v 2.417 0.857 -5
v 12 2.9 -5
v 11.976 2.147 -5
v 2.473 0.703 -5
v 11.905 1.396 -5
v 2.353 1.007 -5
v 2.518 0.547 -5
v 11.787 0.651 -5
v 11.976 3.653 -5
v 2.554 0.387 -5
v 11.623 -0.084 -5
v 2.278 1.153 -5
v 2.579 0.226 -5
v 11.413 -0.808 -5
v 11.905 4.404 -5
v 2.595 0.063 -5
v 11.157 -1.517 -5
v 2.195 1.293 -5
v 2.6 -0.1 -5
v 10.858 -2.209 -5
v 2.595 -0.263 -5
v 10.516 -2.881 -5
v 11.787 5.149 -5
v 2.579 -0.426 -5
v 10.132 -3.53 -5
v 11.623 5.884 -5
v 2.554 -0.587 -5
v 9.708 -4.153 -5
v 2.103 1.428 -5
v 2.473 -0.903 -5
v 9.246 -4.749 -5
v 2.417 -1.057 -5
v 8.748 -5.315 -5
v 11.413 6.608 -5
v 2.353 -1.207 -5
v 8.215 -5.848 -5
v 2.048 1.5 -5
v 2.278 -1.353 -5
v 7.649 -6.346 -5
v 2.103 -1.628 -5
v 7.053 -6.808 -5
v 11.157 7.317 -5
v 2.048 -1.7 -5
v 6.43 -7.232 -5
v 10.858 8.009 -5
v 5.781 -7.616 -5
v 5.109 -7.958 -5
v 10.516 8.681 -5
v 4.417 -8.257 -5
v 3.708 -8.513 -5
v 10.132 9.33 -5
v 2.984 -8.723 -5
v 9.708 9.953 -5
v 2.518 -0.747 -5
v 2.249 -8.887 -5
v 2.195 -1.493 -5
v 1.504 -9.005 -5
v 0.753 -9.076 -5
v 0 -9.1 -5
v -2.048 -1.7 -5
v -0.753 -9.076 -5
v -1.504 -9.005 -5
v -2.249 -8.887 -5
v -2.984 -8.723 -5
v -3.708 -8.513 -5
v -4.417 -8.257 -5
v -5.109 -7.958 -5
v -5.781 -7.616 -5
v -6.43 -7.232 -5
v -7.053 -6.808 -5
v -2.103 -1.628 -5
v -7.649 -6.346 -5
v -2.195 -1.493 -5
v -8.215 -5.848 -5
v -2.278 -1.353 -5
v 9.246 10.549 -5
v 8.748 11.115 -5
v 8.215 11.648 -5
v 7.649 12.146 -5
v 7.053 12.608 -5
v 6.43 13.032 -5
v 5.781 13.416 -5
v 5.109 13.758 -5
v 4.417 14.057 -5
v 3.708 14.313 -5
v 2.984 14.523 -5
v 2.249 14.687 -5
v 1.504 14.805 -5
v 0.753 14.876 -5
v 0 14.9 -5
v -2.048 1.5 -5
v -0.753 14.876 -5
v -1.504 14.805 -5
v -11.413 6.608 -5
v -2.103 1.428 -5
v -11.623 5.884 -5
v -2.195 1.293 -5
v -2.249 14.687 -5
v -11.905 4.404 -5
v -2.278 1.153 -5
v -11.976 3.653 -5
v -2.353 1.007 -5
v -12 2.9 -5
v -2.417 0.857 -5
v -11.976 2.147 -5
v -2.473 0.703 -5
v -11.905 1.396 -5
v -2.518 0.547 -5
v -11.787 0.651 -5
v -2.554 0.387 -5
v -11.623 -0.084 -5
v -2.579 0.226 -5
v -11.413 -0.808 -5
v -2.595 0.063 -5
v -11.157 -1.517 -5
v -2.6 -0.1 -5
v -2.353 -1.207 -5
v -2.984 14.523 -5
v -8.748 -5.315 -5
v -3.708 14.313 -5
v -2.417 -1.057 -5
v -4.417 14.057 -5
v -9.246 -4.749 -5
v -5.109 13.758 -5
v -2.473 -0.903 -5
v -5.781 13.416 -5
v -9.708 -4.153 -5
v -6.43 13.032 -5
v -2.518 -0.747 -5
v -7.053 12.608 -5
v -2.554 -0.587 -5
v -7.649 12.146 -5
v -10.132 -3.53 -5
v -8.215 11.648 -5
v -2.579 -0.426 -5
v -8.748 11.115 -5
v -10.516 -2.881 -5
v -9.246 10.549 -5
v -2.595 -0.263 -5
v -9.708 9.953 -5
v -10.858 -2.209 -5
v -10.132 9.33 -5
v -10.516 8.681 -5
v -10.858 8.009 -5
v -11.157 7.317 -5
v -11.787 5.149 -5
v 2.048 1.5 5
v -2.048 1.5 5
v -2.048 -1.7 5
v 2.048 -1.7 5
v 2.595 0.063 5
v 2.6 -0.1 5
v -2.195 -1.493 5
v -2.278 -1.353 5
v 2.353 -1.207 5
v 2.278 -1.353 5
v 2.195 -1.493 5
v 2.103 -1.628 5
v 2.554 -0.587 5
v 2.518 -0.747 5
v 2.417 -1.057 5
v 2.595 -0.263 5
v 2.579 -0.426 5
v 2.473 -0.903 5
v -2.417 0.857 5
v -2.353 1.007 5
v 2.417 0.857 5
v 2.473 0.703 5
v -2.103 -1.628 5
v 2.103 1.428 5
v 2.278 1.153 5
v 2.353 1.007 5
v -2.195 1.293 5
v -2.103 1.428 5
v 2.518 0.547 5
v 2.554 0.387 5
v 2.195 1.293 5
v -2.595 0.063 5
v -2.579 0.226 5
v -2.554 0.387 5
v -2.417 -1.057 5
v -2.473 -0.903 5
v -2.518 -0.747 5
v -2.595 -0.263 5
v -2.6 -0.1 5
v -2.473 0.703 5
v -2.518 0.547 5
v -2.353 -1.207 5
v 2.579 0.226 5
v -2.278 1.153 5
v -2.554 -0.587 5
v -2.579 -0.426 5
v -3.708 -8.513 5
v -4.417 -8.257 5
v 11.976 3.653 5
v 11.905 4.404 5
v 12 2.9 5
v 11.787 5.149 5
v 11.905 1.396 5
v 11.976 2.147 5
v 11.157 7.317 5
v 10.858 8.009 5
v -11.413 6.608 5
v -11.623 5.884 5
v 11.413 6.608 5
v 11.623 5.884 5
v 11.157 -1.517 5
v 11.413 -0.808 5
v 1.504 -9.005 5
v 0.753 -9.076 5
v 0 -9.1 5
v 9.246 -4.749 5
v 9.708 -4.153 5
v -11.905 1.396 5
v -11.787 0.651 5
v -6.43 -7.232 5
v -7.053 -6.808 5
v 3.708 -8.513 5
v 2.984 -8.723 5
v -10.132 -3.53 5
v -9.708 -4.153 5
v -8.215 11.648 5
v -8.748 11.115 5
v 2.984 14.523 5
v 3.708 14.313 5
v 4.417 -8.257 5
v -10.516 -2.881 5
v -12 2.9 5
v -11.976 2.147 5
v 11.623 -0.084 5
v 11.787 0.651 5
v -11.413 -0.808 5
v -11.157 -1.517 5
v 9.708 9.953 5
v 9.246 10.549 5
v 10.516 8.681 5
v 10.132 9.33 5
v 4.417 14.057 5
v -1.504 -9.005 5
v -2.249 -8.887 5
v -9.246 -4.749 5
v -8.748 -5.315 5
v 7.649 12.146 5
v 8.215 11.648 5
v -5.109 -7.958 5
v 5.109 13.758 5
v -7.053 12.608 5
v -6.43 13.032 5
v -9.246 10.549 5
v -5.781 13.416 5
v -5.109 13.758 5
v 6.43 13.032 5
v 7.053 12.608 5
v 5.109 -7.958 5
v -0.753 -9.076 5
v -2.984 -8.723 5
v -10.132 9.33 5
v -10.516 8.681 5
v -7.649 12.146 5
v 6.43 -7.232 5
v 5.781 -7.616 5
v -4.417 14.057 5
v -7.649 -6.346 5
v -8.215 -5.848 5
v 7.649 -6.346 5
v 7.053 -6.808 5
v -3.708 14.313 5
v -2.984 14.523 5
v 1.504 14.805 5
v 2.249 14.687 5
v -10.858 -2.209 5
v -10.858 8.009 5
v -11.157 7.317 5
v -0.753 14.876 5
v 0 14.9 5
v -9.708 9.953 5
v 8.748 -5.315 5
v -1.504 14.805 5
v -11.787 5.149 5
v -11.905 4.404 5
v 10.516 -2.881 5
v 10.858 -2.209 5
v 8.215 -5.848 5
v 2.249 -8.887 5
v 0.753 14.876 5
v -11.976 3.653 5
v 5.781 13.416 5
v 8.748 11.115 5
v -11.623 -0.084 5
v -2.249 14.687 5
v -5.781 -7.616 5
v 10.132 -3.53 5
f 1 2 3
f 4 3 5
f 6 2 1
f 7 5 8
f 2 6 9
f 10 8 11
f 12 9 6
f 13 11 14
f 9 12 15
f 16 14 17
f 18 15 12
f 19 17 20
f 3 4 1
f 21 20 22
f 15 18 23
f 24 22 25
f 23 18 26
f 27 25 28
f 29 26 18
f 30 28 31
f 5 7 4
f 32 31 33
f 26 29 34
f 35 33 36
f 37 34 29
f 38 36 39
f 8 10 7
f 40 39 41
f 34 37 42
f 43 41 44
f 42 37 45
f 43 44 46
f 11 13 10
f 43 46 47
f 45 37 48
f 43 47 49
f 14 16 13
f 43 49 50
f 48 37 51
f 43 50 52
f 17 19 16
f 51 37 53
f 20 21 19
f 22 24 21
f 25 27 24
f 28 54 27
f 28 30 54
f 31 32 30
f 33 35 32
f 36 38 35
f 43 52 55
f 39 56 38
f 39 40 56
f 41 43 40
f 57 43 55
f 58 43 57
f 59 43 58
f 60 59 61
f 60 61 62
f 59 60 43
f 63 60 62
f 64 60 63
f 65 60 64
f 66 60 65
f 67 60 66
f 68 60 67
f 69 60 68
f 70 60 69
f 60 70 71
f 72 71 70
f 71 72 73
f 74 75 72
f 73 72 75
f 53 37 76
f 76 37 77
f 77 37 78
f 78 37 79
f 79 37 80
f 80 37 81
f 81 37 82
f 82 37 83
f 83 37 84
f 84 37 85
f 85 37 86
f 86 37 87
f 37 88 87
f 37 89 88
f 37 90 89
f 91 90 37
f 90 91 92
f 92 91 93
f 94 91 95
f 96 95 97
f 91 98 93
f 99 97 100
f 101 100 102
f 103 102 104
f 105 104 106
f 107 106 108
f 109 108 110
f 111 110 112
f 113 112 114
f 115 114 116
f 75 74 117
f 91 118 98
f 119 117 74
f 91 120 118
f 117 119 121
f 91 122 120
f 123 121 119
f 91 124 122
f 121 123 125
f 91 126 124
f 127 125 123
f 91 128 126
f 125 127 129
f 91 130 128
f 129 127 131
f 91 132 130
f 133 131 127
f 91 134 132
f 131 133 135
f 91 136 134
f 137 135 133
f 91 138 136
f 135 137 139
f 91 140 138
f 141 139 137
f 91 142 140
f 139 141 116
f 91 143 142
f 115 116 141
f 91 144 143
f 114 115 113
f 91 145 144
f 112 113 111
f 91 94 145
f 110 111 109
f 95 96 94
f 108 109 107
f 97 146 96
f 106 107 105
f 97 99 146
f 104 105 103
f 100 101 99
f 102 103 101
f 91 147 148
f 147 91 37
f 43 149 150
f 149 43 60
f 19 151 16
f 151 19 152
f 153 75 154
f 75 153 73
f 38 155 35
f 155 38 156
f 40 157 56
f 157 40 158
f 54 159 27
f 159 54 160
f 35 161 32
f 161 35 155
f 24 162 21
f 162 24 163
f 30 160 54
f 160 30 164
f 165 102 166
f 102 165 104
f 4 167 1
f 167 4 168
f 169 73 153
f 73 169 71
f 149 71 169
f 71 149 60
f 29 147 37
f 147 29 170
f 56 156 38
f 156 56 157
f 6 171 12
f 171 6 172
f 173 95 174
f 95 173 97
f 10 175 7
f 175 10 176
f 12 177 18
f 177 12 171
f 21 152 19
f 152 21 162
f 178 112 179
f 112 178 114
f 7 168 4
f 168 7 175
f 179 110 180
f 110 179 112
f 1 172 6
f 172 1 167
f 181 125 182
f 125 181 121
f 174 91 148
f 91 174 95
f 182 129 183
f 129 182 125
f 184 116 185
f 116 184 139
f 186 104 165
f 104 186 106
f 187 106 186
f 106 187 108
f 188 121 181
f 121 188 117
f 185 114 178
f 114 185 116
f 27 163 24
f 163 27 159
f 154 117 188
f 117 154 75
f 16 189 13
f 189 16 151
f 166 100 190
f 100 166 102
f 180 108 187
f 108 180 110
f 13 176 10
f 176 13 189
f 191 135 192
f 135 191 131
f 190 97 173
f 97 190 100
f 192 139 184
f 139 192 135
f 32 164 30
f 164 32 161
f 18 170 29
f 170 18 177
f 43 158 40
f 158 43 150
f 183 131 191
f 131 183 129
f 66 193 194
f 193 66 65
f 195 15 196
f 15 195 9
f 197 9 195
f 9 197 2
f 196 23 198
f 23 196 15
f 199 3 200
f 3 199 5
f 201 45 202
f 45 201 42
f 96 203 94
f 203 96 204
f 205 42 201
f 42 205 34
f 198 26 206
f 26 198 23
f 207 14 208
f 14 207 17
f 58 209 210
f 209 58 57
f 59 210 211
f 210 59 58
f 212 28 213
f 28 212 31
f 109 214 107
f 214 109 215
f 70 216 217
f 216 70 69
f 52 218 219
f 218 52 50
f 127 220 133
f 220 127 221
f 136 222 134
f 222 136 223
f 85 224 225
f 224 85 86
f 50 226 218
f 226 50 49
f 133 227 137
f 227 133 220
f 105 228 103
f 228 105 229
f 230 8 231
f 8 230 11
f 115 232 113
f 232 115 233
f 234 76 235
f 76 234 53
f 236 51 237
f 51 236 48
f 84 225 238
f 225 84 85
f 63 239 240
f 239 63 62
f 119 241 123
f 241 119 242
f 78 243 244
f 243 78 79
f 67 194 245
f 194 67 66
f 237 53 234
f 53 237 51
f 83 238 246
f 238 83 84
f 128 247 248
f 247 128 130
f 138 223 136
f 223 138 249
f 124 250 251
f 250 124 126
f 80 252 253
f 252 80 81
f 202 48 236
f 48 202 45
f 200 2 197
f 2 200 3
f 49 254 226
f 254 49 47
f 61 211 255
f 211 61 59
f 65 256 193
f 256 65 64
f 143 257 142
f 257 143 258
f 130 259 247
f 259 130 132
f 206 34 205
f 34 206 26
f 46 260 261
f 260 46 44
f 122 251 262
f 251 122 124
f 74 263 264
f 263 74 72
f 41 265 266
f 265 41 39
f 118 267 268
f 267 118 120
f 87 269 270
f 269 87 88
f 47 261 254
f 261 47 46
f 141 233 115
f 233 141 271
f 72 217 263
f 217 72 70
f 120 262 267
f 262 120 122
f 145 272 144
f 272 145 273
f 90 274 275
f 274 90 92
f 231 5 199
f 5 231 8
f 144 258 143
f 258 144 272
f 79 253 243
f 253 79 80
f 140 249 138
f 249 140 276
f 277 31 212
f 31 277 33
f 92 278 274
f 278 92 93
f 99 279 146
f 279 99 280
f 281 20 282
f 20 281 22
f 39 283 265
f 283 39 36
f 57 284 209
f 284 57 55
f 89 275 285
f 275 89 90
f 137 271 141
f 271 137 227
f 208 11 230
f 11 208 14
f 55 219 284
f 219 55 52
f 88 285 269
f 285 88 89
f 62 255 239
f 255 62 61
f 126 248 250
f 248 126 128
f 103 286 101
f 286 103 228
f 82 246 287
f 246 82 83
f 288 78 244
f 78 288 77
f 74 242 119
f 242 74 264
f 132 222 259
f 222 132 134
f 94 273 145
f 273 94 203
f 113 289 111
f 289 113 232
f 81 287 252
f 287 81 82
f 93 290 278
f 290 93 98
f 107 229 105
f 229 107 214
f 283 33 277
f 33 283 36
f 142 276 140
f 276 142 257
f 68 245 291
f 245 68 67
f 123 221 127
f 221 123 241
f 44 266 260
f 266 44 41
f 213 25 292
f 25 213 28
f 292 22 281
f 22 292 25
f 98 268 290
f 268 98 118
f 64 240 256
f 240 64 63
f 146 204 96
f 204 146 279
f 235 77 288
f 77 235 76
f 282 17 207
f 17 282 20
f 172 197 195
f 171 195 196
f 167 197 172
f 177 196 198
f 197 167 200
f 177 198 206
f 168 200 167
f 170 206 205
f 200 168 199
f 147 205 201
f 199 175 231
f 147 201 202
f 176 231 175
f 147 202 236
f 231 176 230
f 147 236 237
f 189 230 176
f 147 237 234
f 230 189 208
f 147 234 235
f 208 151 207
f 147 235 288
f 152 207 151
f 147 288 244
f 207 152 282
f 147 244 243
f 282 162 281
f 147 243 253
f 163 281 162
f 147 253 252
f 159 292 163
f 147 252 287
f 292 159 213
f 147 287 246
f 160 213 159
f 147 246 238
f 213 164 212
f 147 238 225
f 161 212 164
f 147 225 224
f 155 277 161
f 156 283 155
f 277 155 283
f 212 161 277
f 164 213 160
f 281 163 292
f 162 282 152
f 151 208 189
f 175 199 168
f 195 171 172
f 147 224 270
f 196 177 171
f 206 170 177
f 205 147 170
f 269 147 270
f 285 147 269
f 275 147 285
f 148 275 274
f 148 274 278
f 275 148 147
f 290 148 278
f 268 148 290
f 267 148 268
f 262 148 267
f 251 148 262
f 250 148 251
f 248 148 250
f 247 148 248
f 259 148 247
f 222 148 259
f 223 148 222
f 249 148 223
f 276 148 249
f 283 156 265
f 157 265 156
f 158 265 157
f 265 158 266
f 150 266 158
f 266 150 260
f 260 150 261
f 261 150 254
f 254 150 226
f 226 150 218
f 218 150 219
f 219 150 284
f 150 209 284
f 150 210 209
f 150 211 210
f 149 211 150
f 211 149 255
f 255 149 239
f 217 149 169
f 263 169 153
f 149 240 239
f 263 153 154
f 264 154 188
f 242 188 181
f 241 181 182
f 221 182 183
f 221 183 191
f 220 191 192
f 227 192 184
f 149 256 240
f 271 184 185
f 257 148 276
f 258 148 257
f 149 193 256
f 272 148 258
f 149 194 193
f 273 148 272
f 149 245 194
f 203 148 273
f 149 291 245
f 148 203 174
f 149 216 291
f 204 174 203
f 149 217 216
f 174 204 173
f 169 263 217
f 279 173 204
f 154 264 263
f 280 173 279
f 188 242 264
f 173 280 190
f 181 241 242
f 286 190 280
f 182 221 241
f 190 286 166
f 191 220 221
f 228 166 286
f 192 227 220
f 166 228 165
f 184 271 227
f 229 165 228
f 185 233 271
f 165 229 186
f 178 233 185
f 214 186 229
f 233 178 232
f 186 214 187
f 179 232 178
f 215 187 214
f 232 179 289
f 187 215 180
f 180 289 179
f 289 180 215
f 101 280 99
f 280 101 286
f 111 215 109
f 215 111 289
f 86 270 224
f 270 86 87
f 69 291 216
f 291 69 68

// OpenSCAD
$fn=100; 

module shish() {
    translate([0,0,0]) {
        cylinder(80,1.6,1.6, true);
    }
}

module shish_sheath() {
    translate([0,0,0]) {
        cylinder(80,2.8,2.8, true);
    }
}

module slats_group() {
    for(a = [0, 60, 120, 180, 240, 300]) {
        rotate([0,90,a]) {
            translate([0,0,50]) {
                shish();
            }
        }
    }
}


module turner() {
    cylinder(10, 12, 12, true);
}

translate([0, 2.9,0]) {
    difference() {
        turner();
        translate([0,0,20]) {
            turny();
        }
}
}

/**
module turning_thing() {
    
    difference() {
        hull() {
            translate([0,50,0]) circle(30);
            circle(30);
        }

}

}**/

//turning_thing();



module turny() {

rotate([0,0,90]) {
    
    translate([-3,0,0]) {
    difference() {
        cylinder(100, 2.6, 2.6, true) {
            
        }

        drivers();

    }
    
}


}

}

//turny();


module drivers() {
    translate([26.6,0,0]) {
    cube([50,50,50], true);
    }
    translate([-26.6,0,0]) {
    cube([50,50,55], true);
    }
    
    
}

/**
difference() {
    cylinder(5, 25, 25, true);
    cylinder(10, 15, 15, true);
    tack_holes();
    slats_group();
    
    
}**/

module tack_holes() {
    for(a = [0, 60, 120, 180, 240, 300]) {
        rotate([0,0,a]) {
            translate([17,10,0]) {
                cylinder(20, 1.5, 1.5, true);
            }
        }
    }
}
